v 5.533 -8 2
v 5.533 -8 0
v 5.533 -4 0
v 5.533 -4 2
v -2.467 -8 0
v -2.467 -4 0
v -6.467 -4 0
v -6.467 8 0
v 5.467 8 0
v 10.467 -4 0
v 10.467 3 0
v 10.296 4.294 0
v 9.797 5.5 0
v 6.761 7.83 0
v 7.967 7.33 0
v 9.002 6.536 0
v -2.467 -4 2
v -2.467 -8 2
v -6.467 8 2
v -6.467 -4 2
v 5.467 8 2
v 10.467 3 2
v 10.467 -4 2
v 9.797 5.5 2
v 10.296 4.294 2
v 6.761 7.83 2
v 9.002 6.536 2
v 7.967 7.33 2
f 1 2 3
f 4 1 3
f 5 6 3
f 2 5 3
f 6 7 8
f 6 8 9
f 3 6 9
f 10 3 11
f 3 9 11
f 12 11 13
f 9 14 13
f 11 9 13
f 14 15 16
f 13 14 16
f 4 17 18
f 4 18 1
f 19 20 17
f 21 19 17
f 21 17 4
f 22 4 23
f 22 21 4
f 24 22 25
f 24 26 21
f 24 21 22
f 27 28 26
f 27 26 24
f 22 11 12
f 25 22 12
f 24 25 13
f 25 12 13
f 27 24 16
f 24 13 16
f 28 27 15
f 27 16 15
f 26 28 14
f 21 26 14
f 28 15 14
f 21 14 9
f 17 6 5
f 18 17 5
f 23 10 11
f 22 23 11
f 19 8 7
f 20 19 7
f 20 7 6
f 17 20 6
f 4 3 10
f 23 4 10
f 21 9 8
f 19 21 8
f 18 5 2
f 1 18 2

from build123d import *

# Parameters (mm, degrees)
BOSS_EXTRUDE1_DEPTH = 2


with BuildPart() as part:
    # Sketch1 → Boss-Extrude1 (new body)
    with BuildSketch(Plane.XY):
        with BuildLine():
            Line((5.533412898, -4), (10.466587102, -4))
            Line((10.466587102, -4), (10.466587102, 3))
            ThreePointArc((10.466587102, 3), (9.002121008, 6.535533906), (5.466587102, 8))
            Line((5.466587102, 8), (-6.466587102, 8))
            Line((-6.466587102, 8), (-6.466587102, -4))
            Line((-6.466587102, -4), (-2.466587102, -4))
            Line((-2.466587102, -4), (-2.466587102, -8))
            Line((-2.466587102, -8), (5.533412898, -8))
            Line((5.533412898, -8), (5.533412898, -4))
        make_face()
    extrude(amount=BOSS_EXTRUDE1_DEPTH)


solid = part.part
